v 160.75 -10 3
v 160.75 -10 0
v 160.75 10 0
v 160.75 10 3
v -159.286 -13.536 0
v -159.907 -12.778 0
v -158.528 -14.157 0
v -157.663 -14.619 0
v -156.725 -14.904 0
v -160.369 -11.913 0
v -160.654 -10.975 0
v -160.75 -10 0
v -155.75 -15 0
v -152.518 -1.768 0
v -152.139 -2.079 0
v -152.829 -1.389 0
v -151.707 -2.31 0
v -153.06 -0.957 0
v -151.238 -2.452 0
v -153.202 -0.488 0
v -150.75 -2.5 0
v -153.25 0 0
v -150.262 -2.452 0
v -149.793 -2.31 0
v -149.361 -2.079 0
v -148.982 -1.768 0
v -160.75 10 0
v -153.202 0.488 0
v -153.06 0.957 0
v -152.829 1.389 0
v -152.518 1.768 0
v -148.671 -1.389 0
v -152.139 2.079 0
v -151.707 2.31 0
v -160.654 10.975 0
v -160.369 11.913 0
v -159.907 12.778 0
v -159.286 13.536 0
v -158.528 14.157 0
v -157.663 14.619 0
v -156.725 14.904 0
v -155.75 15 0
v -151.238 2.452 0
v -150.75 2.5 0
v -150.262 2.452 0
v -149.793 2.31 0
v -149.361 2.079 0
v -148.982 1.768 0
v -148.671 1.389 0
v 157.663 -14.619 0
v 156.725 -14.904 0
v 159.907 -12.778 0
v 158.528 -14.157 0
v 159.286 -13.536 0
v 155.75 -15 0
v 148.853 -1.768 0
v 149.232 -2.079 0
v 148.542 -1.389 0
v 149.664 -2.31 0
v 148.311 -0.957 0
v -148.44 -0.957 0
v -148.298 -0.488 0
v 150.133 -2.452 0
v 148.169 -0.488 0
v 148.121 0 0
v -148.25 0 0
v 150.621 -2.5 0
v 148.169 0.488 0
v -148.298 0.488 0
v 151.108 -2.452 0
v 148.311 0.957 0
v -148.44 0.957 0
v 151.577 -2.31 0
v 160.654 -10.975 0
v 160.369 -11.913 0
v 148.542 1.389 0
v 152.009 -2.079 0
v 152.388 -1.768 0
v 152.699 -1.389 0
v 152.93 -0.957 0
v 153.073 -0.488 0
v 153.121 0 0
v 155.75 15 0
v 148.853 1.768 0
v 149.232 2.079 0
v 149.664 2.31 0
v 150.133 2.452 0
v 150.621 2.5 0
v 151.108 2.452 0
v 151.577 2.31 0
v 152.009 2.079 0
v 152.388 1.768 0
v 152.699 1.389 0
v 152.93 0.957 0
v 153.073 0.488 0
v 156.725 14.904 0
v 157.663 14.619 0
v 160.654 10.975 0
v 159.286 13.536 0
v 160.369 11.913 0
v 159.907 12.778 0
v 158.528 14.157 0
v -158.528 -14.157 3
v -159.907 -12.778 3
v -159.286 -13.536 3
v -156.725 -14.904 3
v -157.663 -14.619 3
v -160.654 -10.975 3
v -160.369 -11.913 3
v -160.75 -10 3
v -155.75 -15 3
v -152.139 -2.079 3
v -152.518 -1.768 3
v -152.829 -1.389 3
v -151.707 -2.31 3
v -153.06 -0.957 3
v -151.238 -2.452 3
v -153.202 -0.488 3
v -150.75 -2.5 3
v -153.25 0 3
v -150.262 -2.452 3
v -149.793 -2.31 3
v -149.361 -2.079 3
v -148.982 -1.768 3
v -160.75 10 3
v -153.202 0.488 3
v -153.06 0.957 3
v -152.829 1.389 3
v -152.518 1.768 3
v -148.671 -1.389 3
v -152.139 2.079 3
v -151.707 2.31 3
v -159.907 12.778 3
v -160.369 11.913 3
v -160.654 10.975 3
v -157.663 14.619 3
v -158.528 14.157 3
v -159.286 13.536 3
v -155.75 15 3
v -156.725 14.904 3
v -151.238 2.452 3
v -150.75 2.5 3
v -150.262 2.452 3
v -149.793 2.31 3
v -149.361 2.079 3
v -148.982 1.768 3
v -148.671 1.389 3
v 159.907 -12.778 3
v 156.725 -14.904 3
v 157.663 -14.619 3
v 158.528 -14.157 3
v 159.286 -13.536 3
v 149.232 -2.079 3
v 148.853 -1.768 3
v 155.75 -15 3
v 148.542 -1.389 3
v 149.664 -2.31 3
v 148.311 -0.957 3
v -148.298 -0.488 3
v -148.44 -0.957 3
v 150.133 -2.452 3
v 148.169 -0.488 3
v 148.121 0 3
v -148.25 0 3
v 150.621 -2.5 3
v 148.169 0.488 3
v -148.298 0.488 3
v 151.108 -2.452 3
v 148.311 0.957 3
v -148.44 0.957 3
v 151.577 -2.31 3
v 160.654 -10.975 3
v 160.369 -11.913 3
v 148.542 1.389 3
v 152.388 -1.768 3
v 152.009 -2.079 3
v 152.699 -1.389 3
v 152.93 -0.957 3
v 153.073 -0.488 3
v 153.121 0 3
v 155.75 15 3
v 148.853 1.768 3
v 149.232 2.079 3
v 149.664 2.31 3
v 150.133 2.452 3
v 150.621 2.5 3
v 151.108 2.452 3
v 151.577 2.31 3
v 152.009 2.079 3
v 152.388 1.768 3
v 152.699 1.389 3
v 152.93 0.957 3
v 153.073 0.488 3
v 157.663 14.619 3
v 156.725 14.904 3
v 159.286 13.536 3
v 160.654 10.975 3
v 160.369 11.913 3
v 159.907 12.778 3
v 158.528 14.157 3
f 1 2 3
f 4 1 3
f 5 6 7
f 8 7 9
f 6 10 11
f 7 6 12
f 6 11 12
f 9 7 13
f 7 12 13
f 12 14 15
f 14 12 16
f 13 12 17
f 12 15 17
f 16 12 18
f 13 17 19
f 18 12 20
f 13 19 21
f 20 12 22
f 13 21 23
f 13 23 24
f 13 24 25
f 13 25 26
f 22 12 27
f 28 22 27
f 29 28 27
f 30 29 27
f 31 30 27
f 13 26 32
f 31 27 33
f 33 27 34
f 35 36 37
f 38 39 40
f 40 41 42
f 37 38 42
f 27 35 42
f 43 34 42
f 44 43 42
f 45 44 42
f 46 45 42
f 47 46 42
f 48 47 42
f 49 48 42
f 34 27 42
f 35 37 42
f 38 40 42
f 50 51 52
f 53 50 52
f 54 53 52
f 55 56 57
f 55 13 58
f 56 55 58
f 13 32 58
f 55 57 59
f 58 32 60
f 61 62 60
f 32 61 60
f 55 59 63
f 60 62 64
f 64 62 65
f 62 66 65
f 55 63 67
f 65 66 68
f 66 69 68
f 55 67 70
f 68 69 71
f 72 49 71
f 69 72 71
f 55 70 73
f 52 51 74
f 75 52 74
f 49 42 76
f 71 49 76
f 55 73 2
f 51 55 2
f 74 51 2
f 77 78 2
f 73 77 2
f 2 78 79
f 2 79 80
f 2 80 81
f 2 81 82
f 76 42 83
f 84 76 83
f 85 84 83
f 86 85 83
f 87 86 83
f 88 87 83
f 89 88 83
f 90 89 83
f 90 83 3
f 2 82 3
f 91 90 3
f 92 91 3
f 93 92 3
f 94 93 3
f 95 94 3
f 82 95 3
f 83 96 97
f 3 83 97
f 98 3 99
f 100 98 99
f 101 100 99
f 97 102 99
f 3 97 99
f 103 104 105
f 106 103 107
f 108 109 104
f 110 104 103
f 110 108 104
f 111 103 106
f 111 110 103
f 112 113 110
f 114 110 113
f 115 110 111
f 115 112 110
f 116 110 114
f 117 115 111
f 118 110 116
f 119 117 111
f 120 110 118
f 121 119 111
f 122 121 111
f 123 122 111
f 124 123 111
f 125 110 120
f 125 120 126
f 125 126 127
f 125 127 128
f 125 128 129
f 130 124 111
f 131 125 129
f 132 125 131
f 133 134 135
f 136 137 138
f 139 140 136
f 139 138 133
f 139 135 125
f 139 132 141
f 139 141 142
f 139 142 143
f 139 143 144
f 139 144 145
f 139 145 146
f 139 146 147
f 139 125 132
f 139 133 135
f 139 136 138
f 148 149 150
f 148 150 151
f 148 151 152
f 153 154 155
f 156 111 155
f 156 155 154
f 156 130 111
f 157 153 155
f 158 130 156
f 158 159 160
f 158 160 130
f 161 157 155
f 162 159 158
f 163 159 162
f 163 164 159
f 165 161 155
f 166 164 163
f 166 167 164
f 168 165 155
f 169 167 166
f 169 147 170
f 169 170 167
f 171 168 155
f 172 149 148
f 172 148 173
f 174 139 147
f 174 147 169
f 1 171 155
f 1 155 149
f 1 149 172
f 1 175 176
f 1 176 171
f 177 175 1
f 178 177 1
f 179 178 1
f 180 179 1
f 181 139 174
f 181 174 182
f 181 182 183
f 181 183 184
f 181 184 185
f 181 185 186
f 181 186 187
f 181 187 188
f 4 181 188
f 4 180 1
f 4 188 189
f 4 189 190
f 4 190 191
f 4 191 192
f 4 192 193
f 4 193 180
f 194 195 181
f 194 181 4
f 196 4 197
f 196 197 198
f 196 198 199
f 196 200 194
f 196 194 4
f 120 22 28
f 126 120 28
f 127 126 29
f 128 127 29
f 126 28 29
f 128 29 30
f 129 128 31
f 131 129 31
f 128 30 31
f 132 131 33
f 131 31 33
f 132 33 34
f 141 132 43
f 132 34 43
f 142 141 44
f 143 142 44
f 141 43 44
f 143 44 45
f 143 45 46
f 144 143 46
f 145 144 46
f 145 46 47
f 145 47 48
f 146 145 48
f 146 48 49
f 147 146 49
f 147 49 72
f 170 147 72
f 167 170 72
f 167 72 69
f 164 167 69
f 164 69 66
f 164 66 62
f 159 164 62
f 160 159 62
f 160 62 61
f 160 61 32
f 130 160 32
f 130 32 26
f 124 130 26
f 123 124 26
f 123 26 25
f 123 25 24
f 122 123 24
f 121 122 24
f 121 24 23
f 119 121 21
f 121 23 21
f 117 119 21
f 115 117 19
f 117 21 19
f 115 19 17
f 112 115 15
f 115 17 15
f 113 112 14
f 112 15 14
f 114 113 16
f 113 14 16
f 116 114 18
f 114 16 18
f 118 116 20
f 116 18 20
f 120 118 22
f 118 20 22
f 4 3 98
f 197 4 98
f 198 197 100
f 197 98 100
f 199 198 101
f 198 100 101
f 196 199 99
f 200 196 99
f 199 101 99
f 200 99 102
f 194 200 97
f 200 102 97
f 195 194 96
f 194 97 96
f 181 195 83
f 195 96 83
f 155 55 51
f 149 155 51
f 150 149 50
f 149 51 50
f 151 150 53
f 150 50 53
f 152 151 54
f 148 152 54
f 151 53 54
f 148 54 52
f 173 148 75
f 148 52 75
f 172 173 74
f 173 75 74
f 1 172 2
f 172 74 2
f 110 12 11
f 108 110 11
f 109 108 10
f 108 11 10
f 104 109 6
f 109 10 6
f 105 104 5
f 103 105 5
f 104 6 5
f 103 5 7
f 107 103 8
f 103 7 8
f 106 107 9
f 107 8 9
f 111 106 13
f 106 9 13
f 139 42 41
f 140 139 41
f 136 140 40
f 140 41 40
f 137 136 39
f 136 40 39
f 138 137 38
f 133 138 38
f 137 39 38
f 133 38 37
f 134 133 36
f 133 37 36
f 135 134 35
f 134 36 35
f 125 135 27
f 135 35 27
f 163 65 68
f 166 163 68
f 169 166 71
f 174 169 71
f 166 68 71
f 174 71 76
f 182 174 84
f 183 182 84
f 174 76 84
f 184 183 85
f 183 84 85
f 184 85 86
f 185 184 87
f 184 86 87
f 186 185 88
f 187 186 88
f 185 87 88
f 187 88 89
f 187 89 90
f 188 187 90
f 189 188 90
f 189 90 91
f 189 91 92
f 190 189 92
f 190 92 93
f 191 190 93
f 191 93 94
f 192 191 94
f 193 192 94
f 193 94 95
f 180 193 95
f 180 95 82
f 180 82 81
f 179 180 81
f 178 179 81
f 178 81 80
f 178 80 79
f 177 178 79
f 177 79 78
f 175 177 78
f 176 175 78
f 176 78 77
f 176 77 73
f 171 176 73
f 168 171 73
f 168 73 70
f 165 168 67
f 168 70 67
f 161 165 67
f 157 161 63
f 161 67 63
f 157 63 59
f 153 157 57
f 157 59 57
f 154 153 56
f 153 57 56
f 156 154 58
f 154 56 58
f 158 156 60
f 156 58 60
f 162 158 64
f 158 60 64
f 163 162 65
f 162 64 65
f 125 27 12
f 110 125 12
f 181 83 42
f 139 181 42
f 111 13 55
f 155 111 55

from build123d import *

# Parameters (mm, degrees)
BOSS_EXTRUDE1_DEPTH = 3
SKETCH2_R           = 2.5
CUT_EXTRUDE1_DEPTH  = 4


with BuildPart() as part:
    # Sketch1 → Boss-Extrude1 (new body)
    with BuildSketch(Plane.XY):
        with BuildLine():
            Line((155.75, 15), (0, 15))
            Line((0, 15), (0, 0))
            Line((0, 0), (160.75, 0))
            Line((160.75, 0), (160.75, 10))
            ThreePointArc((160.75, 10), (159.285533906, 13.535533906), (155.75, 15))
        make_face()
        with BuildLine():
            Line((0, 15), (-155.75, 15))
            ThreePointArc((-155.75, 15), (-159.285533906, 13.535533906), (-160.75, 10))
            Line((-160.75, 10), (-160.75, 0))
            Line((-160.75, 0), (0, 0))
            Line((0, 0), (0, 15))
        make_face()
        with BuildLine():
            Line((0, -15), (0, 0))
            Line((0, 0), (-160.75, 0))
            Line((-160.75, 0), (-160.75, -10))
            ThreePointArc((-160.75, -10), (-159.285533906, -13.535533906), (-155.75, -15))
            Line((-155.75, -15), (0, -15))
        make_face()
        with BuildLine():
            Line((160.75, 0), (0, 0))
            Line((0, 0), (0, -15))
            Line((0, -15), (155.75, -15))
            ThreePointArc((155.75, -15), (159.285533906, -13.535533906), (160.75, -10))
            Line((160.75, -10), (160.75, 0))
        make_face()
    extrude(amount=BOSS_EXTRUDE1_DEPTH)

    # Sketch2 → Cut-Extrude1 (cut, through all)
    with BuildSketch(Plane(origin=(0, 0, 0), x_dir=(-1, 0, 0), z_dir=(0, 0, -1))):
        with BuildLine():
            ThreePointArc((-153.120541102, 0), (-150.620541102, -2.5), (-148.120541102, 0))
            Line((-148.120541102, 0), (-153.120541102, 0))
        make_face()
        with BuildLine():
            Line((-153.120541102, 0), (-148.120541102, 0))
            ThreePointArc((-148.120541102, 0), (-150.620541102, 2.5), (-153.120541102, 0))
        make_face()
        with Locations((150.75, 0)):
            Circle(SKETCH2_R)
    extrude(amount=-CUT_EXTRUDE1_DEPTH, mode=Mode.SUBTRACT)


solid = part.part
